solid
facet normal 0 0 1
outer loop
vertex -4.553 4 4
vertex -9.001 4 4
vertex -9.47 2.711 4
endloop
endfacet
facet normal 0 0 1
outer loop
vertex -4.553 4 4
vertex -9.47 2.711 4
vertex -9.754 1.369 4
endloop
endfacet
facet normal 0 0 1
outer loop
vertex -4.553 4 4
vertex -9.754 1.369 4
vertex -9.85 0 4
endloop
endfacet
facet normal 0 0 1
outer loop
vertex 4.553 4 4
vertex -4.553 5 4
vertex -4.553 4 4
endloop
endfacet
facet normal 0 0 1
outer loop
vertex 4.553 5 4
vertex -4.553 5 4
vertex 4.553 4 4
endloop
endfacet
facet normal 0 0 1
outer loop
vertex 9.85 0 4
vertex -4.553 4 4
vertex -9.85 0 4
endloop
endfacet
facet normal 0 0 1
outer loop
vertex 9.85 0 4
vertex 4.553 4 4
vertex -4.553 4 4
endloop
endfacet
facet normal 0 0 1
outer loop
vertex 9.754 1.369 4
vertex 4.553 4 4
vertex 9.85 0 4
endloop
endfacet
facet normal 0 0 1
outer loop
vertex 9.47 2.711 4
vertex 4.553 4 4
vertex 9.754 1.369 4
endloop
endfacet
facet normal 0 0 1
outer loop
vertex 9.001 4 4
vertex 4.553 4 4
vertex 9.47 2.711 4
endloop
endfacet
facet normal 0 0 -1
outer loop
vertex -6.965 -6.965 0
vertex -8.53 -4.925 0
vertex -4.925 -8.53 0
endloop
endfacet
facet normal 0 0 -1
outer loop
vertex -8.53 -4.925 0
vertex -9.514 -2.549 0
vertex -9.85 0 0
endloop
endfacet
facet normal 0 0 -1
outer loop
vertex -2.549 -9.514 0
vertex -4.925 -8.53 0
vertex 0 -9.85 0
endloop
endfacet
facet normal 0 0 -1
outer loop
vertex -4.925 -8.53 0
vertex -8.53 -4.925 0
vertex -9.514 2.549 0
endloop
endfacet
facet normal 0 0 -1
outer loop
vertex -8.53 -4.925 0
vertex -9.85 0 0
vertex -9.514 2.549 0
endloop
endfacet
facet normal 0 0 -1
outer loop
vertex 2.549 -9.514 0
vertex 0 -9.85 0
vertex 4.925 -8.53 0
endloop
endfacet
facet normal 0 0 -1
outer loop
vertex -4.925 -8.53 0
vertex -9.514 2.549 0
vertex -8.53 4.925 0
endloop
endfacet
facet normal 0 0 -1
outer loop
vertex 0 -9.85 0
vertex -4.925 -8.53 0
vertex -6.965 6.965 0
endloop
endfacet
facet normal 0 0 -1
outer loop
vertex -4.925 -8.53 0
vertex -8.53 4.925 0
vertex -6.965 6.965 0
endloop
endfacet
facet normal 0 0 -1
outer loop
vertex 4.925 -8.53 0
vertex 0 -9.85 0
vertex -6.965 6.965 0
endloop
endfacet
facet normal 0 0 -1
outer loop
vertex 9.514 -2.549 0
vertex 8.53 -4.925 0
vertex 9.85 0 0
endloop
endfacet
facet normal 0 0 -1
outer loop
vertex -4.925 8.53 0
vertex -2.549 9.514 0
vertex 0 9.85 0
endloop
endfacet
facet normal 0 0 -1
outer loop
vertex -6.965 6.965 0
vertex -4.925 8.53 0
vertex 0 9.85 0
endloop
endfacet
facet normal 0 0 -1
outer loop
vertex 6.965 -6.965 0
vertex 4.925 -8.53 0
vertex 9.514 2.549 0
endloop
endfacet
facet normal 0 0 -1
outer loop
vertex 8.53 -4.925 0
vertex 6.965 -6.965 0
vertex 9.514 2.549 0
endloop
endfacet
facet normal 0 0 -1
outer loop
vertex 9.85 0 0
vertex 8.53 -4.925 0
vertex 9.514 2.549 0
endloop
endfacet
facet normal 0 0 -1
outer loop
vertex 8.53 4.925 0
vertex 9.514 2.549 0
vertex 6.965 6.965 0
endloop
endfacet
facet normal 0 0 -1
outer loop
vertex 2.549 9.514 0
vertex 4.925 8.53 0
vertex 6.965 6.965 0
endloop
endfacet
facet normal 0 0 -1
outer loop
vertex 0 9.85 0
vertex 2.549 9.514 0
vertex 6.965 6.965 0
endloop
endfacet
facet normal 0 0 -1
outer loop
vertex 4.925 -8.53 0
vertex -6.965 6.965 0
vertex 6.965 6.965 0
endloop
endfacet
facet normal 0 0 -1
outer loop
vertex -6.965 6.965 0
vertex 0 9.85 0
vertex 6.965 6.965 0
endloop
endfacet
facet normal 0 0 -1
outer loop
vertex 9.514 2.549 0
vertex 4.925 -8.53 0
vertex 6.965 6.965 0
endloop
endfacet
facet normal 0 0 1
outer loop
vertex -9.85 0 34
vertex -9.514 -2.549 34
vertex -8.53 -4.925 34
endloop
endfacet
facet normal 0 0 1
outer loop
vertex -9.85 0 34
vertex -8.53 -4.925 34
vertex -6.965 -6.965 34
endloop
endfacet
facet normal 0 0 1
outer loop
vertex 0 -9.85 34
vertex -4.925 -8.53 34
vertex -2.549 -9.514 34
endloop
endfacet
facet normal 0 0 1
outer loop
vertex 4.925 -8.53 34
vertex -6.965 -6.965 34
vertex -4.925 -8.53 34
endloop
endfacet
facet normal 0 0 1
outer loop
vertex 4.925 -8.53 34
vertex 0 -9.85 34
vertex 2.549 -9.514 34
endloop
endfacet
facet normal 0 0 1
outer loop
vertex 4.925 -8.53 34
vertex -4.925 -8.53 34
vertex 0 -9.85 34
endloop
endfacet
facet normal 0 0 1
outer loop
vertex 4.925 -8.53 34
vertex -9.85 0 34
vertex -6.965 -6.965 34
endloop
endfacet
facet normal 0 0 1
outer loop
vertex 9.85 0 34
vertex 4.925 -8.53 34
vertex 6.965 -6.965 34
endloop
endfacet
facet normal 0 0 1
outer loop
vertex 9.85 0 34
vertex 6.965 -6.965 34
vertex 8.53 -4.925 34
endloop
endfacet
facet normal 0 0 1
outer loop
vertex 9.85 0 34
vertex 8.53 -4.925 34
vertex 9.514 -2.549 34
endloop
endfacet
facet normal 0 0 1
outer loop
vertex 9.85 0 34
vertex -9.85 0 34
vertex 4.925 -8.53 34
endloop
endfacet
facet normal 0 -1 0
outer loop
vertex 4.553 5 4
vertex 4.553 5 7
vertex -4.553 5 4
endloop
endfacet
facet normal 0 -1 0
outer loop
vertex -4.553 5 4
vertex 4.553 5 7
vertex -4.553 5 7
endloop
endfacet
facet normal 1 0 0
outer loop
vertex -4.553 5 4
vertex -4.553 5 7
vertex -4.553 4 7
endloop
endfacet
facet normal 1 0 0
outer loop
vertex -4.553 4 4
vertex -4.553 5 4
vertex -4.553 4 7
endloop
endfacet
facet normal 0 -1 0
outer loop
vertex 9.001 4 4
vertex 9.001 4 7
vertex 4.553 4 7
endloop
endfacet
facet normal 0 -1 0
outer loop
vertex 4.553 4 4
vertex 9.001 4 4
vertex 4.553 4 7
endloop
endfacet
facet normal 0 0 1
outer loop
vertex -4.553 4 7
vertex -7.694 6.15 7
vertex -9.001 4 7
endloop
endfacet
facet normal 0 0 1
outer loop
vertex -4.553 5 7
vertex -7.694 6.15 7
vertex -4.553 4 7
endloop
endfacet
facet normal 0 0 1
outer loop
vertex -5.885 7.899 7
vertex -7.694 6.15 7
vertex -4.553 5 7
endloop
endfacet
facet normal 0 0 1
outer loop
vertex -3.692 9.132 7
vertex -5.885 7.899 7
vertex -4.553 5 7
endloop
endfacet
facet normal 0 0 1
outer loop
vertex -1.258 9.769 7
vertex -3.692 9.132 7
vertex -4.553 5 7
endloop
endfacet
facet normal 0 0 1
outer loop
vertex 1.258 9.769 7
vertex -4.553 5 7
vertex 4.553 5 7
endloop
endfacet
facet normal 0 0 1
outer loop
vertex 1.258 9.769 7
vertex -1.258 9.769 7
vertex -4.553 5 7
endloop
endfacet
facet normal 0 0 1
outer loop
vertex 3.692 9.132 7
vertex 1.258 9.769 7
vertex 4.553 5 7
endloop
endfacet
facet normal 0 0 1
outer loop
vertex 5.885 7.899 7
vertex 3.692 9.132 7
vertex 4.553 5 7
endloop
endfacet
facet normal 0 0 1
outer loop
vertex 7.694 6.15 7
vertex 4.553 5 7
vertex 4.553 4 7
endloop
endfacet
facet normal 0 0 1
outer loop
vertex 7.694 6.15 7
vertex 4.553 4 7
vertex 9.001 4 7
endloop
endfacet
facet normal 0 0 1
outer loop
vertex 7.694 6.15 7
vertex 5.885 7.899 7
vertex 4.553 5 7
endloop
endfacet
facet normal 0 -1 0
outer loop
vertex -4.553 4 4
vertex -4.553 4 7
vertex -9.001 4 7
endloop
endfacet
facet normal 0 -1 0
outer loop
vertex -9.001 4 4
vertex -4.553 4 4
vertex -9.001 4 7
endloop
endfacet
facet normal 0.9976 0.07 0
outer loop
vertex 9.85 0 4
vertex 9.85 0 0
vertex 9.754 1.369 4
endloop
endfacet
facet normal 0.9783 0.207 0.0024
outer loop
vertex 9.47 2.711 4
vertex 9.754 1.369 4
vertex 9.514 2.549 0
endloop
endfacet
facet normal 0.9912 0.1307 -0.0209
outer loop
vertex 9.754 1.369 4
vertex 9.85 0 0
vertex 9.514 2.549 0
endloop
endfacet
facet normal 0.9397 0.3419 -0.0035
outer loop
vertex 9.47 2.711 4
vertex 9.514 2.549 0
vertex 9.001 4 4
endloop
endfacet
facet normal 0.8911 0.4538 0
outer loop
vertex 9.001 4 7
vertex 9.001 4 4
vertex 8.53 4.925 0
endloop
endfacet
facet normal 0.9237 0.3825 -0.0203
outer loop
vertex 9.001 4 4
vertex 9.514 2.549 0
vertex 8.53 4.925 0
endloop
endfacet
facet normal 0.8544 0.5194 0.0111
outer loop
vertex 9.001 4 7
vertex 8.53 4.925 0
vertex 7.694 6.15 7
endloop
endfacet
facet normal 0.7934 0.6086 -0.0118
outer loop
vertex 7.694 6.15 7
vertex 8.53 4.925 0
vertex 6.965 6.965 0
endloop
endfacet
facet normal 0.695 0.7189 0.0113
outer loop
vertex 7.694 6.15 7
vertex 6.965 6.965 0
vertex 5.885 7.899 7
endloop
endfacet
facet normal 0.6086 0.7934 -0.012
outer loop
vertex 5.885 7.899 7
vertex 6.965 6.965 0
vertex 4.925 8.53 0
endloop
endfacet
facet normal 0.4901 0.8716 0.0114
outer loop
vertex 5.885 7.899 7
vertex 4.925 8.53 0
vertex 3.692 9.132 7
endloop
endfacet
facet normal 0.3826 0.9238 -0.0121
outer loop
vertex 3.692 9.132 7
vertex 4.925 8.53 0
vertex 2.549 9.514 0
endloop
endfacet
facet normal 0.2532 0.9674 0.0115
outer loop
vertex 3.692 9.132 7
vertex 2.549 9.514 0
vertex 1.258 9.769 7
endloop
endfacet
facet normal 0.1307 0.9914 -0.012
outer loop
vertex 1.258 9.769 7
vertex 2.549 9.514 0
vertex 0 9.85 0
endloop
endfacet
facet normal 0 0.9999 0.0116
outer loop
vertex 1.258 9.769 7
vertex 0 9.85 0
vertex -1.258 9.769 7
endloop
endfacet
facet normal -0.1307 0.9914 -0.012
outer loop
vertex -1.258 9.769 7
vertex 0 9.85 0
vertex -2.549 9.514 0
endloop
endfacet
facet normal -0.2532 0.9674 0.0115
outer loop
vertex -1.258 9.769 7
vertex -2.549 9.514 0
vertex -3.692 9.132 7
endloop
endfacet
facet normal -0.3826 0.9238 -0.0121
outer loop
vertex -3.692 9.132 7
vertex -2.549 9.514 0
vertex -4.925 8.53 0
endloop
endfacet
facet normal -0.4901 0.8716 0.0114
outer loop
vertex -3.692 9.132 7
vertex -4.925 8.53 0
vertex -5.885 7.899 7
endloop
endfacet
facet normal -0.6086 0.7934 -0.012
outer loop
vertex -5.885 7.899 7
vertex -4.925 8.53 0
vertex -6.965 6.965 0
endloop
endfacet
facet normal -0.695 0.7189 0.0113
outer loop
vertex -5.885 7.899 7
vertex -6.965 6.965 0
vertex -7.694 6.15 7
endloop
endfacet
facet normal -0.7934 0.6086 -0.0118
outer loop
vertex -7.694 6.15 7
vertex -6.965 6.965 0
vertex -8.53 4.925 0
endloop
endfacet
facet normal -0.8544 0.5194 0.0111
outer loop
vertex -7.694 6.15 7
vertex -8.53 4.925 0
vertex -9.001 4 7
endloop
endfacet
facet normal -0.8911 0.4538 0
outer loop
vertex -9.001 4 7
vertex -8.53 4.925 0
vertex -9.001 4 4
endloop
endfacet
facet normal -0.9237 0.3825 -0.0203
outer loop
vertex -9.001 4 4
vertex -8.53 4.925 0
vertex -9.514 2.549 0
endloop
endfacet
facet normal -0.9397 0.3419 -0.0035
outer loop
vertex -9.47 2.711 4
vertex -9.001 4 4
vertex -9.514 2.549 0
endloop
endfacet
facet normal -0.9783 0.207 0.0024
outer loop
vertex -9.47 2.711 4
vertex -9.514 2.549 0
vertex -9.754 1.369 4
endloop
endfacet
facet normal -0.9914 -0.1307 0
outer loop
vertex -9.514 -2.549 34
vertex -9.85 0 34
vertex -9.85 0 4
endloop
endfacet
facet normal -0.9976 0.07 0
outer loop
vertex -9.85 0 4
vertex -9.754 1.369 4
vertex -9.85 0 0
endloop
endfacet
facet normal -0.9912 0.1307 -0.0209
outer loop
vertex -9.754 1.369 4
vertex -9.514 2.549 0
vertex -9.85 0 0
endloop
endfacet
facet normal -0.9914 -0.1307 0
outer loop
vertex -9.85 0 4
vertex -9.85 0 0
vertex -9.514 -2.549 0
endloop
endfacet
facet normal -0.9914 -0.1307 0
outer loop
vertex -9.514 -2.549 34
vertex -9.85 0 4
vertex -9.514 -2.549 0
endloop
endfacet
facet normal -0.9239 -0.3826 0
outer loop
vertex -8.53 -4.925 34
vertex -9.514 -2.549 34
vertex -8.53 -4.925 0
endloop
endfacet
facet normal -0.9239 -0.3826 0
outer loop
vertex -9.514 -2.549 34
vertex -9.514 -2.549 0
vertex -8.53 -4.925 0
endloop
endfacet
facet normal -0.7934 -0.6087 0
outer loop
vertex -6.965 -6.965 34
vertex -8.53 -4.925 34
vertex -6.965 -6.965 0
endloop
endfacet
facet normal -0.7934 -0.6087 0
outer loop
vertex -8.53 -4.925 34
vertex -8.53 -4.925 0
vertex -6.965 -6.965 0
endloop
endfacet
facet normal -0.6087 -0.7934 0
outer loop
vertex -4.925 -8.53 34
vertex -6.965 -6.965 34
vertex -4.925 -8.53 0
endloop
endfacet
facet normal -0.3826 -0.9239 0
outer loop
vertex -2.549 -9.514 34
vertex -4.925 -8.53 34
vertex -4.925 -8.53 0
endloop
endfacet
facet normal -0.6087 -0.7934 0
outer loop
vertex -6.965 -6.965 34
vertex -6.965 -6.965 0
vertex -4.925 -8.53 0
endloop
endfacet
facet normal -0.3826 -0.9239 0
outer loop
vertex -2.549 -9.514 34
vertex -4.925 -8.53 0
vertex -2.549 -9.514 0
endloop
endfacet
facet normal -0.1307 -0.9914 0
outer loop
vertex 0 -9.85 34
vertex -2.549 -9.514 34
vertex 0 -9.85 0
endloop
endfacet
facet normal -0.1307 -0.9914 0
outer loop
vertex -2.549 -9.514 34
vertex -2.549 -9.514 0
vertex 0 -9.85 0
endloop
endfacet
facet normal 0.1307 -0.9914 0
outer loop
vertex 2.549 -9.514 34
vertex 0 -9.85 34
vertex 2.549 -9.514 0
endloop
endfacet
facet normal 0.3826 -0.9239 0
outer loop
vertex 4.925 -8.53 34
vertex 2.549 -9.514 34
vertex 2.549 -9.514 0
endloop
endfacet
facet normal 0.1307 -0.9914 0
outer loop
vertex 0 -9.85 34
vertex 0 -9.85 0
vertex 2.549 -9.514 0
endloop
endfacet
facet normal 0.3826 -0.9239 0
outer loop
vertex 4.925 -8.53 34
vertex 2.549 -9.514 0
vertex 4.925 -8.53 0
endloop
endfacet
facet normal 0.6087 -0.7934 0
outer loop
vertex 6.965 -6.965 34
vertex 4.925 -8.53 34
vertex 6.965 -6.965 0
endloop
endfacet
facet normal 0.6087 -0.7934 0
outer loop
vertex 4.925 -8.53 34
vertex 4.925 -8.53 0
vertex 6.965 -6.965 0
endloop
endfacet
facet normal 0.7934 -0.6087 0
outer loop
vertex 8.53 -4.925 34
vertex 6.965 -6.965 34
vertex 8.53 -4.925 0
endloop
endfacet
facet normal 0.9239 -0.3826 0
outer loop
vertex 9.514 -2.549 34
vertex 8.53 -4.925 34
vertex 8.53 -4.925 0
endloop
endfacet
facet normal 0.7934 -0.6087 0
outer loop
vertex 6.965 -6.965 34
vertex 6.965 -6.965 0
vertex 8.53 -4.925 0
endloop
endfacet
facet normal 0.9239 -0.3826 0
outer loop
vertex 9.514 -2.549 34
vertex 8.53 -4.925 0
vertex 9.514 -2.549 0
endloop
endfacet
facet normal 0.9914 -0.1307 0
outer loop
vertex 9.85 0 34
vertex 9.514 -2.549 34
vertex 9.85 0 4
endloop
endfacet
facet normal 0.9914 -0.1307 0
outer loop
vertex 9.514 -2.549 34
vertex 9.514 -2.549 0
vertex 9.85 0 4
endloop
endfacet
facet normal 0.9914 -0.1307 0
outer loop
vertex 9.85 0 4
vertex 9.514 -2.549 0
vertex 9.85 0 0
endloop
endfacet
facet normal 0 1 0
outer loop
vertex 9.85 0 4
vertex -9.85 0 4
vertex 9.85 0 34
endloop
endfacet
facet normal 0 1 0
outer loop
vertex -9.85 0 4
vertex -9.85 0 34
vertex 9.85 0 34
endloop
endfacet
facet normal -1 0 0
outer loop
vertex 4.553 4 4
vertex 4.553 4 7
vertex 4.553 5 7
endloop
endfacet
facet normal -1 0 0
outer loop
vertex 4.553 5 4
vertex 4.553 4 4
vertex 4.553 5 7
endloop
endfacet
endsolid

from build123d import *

# Parameters (mm, degrees)
F0_R     = 9.85
F1_DEPTH = 34
F3_DEPTH = 27
F5_DEPTH = 3


with BuildPart() as f1:
    # F0 (on Top) → F1 (new body)
    with BuildSketch(Plane.XY):
        Circle(F0_R)
    extrude(amount=F1_DEPTH)

    # F2 (on face) → F3 (cut)
    with BuildSketch(Plane.XY.offset(34)):
        with BuildLine():
            Line((-9.85, 0), (9.85, 0))
            ThreePointArc((9.85, 0), (0, 9.85), (-9.85, 0))
        make_face()
    extrude(amount=-F3_DEPTH, mode=Mode.SUBTRACT)

    # F4 (on face) → F5 (cut)
    with BuildSketch(Plane.XY.offset(7)):
        with BuildLine():
            ThreePointArc((-9.00125, 4), (-9.635476, 2.044528), (-9.85, 0))
            Line((-9.85, 0), (9.85, 0))
            ThreePointArc((9.85, 0), (9.635476, 2.044528), (9.00125, 4))
            Line((9.00125, 4), (4.553003, 4))
            Line((4.553003, 4), (4.553003, 5))
            Line((4.553003, 5), (-4.553003, 5))
            Line((-4.553003, 5), (-4.553003, 4))
            Line((-4.553003, 4), (-9.00125, 4))
        make_face()
    extrude(amount=-F5_DEPTH, mode=Mode.SUBTRACT)


solid = f1.part
